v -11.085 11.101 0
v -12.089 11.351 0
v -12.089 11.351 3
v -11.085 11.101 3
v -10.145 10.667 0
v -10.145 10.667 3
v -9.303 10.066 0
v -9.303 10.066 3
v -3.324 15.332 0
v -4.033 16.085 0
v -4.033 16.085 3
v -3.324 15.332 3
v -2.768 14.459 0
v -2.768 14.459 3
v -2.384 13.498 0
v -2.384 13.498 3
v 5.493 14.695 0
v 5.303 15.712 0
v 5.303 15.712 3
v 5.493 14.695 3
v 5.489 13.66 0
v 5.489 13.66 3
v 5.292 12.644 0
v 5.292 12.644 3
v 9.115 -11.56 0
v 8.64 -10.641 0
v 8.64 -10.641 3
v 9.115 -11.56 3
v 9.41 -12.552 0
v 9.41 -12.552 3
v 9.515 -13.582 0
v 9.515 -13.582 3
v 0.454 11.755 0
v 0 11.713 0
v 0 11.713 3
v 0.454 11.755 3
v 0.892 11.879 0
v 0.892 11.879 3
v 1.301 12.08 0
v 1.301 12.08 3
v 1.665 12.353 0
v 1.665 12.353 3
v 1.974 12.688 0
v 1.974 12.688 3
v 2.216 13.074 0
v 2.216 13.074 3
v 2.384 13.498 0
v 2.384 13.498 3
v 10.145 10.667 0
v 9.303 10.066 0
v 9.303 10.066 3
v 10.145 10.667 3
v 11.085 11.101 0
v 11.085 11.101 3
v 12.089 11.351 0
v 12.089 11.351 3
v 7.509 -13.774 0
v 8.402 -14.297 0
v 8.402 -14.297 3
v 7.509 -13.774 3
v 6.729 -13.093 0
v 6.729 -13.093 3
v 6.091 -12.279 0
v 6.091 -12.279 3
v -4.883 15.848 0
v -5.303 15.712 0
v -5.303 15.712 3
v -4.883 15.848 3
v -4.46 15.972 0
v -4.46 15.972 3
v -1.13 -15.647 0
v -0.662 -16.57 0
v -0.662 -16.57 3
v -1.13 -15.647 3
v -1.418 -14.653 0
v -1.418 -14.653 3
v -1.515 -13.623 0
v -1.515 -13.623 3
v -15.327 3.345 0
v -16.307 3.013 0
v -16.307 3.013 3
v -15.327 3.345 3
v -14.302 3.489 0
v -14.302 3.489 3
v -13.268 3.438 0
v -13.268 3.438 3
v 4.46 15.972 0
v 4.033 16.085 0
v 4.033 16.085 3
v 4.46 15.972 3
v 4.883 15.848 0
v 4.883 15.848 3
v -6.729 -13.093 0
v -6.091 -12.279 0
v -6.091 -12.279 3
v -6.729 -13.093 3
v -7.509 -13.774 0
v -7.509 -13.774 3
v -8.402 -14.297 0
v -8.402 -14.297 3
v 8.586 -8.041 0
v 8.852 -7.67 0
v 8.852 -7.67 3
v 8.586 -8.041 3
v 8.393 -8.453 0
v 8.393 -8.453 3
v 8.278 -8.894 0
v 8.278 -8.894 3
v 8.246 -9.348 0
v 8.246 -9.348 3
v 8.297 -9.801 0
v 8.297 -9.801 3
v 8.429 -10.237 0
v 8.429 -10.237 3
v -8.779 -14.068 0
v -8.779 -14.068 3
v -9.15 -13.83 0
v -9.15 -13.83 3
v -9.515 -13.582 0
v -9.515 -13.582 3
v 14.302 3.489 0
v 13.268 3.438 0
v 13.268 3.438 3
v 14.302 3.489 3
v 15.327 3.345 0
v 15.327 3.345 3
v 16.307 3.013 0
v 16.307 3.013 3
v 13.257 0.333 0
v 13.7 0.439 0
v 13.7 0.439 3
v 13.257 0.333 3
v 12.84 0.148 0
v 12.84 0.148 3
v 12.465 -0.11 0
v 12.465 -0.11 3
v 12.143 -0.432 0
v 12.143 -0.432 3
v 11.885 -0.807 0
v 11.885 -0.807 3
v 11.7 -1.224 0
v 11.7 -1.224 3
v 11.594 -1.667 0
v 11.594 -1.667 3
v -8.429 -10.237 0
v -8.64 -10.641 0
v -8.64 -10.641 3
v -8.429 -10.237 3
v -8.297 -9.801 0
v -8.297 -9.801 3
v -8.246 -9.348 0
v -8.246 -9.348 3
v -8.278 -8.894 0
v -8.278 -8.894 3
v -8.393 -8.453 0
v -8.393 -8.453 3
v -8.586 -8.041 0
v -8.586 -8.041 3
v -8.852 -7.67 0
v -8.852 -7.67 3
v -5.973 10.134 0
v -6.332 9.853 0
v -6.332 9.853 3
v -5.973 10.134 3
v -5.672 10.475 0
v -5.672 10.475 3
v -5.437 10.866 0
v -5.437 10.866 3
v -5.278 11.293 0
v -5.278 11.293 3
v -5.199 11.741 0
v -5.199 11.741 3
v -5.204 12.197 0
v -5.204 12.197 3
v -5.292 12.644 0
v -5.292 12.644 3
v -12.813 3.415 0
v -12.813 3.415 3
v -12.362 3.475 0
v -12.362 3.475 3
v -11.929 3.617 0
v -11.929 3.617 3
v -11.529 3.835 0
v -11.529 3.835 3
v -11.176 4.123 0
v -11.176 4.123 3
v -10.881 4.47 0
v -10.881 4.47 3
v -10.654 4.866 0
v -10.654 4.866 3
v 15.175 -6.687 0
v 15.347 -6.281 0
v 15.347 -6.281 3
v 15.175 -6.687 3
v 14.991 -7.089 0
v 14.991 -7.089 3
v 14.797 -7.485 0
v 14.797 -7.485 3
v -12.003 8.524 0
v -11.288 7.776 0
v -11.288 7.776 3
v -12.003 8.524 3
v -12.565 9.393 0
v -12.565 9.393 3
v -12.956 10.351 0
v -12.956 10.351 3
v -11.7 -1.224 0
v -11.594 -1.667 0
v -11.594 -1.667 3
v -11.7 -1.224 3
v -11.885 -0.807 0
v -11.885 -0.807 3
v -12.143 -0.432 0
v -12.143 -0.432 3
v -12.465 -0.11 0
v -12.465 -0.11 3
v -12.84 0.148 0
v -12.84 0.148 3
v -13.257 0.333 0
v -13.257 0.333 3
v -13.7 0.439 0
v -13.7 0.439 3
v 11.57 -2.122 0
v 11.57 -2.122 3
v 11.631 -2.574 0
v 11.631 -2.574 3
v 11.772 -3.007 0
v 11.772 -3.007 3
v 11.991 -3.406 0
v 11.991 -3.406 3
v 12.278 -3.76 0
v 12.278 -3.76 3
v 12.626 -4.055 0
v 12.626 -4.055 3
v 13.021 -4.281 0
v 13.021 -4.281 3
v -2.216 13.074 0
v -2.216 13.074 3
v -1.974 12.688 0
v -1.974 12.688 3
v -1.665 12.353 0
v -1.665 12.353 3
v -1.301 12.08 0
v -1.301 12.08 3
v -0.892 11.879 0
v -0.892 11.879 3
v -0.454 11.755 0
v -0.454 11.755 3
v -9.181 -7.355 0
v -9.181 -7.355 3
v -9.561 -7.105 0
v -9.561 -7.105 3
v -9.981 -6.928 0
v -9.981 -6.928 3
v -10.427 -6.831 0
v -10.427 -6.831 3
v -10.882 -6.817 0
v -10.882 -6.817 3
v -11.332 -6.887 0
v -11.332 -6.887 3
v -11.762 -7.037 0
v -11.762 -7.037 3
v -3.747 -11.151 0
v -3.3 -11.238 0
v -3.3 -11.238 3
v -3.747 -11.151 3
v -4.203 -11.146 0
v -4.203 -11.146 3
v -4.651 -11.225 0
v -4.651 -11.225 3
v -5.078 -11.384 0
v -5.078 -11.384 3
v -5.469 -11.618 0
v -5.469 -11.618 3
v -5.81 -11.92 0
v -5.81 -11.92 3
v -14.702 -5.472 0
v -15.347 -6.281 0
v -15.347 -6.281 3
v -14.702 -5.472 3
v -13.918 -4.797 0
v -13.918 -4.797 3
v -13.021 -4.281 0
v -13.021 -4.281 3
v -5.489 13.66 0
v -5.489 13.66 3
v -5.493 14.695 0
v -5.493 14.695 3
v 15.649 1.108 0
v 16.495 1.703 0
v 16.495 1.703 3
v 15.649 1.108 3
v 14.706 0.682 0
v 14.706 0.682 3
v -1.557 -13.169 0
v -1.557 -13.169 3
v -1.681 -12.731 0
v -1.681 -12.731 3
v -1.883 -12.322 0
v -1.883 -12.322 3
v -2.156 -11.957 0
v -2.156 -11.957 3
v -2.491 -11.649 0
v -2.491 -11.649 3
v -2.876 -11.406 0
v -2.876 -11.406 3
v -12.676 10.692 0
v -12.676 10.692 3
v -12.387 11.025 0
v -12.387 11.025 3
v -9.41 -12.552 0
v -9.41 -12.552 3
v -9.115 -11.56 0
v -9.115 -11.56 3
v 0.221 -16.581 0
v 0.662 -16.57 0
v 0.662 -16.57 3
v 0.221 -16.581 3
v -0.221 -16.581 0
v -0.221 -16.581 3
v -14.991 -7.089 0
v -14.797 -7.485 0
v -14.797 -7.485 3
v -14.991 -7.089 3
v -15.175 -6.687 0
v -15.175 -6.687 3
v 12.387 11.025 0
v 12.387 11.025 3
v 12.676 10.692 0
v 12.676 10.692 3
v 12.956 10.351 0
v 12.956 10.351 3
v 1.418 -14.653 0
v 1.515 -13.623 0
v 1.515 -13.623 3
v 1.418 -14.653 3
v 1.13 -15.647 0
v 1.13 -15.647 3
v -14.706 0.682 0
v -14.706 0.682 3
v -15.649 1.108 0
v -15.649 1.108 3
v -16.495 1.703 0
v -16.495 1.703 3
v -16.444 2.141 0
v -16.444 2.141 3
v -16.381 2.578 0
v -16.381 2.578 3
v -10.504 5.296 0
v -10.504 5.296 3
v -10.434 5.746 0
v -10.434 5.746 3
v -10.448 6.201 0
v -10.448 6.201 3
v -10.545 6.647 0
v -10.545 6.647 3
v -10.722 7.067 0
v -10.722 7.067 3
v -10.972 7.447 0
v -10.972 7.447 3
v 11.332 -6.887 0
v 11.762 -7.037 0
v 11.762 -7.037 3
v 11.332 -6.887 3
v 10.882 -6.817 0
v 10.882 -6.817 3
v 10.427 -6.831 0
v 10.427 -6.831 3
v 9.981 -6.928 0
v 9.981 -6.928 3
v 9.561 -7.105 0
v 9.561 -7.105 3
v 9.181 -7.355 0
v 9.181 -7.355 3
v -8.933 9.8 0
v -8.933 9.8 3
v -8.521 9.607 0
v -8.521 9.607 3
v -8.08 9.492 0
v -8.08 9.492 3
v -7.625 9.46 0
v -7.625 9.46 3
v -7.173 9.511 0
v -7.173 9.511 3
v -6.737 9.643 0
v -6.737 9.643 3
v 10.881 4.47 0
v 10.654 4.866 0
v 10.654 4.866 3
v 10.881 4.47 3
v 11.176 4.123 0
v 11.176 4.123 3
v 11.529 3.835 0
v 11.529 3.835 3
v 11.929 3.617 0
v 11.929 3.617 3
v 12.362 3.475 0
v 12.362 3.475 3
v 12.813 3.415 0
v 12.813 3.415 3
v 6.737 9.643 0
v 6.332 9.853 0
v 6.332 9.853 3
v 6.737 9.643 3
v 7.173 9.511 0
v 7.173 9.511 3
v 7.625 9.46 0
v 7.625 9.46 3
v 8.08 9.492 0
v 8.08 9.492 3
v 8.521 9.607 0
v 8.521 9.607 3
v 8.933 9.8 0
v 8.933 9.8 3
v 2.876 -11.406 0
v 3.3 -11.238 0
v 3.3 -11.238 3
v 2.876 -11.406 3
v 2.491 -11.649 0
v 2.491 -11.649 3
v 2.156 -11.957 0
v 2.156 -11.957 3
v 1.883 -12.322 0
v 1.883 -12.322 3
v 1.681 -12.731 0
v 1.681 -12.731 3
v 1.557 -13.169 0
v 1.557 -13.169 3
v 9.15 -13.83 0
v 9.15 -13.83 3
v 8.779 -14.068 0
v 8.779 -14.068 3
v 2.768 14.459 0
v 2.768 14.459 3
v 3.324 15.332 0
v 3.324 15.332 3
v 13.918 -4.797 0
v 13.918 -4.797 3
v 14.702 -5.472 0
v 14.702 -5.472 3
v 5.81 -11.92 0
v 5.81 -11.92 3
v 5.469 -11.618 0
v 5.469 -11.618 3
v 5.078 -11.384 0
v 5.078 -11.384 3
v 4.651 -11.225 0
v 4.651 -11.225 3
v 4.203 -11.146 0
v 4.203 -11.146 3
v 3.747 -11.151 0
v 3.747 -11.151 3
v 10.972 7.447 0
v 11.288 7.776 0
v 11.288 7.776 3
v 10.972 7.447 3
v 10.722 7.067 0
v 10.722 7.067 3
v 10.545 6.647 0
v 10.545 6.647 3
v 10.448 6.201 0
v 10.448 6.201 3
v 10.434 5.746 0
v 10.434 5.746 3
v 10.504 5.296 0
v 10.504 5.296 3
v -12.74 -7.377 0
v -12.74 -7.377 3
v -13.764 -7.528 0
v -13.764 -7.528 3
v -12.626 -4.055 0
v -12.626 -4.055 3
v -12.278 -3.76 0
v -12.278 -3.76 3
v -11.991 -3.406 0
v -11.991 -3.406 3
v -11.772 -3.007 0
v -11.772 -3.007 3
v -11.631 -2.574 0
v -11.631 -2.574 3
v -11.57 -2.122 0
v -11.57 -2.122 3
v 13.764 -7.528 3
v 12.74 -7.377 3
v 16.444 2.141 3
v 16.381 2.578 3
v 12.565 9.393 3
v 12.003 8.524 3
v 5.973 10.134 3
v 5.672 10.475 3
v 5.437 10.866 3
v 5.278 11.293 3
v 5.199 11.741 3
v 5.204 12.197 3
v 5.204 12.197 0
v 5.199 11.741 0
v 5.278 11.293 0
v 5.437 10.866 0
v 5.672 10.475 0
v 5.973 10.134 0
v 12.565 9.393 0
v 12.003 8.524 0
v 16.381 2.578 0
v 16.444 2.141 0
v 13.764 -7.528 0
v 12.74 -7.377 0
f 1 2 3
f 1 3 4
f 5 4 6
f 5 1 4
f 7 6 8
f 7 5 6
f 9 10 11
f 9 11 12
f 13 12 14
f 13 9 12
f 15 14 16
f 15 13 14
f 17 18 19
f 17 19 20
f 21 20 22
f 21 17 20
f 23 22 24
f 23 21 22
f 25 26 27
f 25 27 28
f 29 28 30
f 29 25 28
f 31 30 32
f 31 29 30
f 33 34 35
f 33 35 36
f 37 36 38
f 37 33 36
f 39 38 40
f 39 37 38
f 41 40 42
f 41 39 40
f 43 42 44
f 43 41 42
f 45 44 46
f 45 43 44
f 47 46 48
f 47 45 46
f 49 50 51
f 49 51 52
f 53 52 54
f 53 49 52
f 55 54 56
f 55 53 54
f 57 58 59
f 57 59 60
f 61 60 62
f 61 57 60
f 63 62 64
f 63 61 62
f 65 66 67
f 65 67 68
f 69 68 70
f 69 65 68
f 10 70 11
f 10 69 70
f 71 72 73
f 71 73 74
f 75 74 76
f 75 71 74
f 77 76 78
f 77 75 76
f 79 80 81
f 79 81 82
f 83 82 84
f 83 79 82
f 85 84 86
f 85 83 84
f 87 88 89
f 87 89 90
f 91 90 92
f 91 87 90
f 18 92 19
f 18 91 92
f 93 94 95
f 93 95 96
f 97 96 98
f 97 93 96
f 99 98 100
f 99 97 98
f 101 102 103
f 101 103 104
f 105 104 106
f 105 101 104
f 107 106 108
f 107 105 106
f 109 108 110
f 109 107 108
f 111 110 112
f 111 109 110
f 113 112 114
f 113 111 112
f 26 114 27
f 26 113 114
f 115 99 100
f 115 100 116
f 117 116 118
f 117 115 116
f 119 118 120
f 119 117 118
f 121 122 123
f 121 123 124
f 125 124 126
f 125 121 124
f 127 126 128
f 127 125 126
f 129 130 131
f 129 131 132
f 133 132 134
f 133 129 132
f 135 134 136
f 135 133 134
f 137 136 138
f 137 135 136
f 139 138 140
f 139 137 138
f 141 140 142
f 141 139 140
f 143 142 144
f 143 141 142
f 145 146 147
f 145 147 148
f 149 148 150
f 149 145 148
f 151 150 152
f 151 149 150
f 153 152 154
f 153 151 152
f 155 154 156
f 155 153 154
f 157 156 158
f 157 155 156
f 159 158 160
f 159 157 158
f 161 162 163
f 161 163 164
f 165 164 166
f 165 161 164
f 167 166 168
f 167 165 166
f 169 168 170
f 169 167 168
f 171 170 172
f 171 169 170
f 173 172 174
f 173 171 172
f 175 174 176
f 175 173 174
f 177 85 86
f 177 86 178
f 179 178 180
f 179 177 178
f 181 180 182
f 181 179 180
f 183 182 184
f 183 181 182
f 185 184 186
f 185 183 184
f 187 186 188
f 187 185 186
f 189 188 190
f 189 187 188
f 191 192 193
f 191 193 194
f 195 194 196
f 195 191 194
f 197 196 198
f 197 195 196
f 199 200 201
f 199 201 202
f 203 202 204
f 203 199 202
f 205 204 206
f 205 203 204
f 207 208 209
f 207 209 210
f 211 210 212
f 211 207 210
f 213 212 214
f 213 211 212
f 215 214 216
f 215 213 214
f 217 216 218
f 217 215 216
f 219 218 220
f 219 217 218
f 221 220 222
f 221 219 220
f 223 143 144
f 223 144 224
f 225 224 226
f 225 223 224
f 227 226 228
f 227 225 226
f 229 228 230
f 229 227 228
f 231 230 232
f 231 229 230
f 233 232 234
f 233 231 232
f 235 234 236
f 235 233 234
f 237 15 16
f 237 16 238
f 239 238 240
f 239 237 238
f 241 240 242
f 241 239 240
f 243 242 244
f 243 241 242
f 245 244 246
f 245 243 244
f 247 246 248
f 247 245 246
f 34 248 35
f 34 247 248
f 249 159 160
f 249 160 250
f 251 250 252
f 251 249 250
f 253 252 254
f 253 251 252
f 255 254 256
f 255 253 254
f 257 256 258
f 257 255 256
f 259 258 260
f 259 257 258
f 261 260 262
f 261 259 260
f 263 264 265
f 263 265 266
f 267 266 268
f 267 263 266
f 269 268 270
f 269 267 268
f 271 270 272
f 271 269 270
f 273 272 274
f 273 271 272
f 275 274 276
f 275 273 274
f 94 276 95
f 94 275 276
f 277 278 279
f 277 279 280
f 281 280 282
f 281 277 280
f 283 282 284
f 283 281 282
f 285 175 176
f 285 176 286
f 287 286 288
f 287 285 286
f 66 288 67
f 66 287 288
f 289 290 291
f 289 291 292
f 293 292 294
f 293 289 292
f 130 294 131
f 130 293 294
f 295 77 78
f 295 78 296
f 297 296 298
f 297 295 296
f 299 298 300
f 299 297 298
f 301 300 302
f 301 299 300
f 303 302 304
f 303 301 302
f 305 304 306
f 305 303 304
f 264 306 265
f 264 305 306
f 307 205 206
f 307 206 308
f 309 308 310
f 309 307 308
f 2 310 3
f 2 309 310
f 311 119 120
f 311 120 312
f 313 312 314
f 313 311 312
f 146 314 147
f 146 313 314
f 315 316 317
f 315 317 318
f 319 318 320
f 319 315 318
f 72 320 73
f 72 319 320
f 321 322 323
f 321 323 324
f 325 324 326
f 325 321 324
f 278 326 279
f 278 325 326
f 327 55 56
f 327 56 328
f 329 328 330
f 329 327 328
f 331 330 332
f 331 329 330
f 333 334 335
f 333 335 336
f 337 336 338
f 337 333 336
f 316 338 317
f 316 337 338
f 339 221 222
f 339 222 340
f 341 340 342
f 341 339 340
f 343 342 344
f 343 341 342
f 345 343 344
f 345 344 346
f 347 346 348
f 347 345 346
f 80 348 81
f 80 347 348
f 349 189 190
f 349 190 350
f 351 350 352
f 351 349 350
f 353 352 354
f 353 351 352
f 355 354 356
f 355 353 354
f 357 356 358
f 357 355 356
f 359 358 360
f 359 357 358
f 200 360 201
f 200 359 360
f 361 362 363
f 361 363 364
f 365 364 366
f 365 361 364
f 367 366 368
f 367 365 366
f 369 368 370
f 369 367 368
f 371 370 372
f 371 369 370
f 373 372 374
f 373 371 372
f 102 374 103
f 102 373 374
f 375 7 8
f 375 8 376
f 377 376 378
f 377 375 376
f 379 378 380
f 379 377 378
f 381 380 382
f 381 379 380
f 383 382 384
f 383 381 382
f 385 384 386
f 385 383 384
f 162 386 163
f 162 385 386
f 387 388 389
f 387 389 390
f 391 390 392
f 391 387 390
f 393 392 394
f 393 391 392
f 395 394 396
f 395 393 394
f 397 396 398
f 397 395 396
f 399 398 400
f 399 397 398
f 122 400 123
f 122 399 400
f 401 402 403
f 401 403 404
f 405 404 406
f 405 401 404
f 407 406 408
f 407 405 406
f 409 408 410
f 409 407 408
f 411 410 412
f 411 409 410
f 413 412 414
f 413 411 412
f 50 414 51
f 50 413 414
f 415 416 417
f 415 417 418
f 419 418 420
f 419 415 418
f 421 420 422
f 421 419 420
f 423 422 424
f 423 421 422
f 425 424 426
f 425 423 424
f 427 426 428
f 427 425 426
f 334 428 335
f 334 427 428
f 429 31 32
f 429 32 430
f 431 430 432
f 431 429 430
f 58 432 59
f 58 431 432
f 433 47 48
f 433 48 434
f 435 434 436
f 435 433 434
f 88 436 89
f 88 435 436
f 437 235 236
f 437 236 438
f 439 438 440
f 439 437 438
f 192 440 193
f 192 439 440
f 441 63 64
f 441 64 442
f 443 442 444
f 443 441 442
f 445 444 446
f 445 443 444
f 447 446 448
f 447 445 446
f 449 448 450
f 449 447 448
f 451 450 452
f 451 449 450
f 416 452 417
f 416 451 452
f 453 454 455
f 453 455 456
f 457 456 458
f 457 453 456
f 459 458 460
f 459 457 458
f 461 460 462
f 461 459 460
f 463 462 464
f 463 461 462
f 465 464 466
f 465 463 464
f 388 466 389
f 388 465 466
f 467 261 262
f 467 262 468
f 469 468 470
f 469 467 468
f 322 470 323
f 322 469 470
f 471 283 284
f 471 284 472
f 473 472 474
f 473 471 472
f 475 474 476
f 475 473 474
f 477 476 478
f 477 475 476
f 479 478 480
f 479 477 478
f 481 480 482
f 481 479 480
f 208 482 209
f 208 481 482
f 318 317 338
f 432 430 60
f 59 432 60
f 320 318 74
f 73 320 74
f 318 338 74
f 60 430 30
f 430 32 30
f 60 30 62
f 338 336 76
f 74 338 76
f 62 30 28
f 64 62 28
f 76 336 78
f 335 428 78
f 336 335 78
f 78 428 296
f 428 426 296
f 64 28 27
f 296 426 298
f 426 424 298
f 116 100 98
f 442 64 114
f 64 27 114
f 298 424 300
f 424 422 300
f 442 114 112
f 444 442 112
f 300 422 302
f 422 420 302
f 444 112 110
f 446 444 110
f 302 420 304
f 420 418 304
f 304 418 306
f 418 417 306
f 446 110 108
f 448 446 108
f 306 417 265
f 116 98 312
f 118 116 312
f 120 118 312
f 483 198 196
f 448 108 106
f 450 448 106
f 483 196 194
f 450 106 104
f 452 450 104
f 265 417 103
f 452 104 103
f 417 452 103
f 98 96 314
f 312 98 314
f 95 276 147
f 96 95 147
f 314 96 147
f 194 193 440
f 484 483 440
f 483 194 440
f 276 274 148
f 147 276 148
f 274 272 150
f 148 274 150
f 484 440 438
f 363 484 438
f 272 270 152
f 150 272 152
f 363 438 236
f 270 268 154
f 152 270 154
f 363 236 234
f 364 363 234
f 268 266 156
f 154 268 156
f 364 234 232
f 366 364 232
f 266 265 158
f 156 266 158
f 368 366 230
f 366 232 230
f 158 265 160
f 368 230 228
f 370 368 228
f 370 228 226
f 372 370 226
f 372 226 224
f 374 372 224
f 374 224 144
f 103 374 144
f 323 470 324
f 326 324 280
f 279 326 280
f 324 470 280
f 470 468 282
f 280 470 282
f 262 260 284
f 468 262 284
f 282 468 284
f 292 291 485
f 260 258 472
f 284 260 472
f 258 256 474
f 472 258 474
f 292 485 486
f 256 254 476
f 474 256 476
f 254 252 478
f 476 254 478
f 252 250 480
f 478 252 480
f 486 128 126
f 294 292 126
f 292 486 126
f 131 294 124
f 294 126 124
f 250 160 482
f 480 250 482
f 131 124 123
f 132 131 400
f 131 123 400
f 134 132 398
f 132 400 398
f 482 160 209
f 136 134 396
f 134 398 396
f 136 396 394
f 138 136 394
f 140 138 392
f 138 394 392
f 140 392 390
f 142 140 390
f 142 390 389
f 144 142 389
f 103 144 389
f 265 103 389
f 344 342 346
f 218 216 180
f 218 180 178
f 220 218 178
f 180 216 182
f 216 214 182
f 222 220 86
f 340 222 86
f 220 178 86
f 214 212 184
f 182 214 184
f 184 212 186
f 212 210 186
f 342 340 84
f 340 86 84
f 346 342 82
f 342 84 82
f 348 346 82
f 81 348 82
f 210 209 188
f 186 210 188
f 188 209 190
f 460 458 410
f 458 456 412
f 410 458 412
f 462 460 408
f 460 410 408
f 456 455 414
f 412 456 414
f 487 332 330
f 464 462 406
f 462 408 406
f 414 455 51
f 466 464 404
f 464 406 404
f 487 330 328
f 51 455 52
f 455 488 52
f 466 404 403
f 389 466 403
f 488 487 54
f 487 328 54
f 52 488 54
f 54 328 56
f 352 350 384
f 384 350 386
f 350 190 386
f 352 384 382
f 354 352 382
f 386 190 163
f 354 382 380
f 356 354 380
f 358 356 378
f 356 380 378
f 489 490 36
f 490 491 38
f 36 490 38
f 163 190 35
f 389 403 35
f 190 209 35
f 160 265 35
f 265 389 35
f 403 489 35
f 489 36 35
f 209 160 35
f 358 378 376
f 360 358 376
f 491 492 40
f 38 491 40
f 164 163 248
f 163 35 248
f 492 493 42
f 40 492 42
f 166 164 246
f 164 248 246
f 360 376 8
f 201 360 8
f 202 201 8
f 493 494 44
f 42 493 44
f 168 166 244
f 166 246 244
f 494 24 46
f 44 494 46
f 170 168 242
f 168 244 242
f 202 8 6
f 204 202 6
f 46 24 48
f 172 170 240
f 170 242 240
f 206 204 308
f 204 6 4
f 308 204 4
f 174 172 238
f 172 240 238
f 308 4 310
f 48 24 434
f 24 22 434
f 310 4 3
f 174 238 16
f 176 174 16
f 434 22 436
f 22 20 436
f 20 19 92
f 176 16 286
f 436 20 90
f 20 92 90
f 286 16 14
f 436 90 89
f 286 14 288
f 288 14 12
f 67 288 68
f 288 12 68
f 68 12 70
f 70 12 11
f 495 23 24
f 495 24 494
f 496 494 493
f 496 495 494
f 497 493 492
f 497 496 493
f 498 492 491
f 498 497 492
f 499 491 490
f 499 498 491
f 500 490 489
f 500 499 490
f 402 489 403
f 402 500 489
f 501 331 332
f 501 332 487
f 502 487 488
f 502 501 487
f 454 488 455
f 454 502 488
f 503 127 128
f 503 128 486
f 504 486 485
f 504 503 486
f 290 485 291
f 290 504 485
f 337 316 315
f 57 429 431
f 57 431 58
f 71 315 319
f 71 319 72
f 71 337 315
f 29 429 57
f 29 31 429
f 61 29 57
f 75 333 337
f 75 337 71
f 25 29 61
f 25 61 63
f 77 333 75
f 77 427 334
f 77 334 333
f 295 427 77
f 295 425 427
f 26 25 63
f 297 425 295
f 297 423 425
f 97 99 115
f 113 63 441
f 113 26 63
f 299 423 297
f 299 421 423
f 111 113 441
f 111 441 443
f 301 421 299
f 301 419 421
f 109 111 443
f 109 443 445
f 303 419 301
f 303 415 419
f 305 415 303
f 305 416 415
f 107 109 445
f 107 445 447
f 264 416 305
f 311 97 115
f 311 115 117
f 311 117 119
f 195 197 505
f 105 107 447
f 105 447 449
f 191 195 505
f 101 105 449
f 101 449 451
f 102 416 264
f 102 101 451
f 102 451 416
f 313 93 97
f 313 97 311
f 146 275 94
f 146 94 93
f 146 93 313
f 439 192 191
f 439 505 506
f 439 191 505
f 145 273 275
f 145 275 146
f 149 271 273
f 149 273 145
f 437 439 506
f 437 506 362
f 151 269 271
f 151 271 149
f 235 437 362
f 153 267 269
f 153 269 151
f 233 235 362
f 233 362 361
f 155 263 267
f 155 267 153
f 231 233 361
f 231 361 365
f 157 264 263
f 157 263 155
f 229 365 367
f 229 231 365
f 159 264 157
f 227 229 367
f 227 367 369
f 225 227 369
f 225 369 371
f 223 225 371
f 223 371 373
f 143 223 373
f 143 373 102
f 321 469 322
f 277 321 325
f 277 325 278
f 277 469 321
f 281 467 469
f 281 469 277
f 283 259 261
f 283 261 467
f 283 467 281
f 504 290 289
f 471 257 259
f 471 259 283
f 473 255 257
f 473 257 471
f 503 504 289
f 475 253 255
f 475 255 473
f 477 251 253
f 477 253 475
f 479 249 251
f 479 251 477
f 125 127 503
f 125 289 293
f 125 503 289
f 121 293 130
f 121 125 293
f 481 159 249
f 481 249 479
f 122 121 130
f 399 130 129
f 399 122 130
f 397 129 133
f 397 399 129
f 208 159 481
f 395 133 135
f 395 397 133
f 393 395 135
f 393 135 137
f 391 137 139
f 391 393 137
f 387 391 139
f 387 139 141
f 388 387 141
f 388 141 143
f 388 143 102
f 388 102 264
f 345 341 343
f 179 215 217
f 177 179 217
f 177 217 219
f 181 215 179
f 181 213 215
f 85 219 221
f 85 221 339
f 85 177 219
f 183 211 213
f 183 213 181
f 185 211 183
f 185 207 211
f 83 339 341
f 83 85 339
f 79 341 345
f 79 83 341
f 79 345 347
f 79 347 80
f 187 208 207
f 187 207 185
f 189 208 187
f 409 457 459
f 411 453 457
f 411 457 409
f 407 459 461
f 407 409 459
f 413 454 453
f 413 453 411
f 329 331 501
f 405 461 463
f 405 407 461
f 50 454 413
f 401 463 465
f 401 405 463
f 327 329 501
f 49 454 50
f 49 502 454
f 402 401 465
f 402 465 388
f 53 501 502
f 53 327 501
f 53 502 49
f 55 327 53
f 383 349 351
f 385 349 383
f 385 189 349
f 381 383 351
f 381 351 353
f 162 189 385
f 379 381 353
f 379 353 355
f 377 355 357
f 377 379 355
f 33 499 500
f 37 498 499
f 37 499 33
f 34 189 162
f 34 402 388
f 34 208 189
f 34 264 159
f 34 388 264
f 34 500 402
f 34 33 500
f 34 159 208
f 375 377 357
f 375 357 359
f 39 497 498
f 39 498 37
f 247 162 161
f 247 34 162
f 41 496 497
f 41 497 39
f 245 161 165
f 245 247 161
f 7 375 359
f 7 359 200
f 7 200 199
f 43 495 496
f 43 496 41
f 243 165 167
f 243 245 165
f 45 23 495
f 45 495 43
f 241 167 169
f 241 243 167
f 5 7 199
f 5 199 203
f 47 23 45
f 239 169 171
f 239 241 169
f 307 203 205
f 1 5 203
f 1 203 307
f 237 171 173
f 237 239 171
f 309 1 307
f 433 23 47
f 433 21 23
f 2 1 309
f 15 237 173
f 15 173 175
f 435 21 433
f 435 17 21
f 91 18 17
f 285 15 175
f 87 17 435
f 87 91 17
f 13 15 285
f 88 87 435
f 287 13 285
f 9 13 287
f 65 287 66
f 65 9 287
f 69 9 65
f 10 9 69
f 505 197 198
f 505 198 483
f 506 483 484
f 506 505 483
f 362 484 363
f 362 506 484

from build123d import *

# Parameters (mm, degrees)
EXTRUDE_1_DEPTH          = 3
PATTERN_CIRCULAR_1_COUNT = 11


with BuildPart() as part:
    # Эскиз2 → Бобышка-Вытянуть1 (new body)
    with BuildSketch(Plane.XY):
        with BuildLine():
            Line((0, 0), (0, 11.712862132))
            ThreePointArc((0, 11.712862132), (1.489205001, 12.208517148), (2.384340039, 13.497756728))
            ThreePointArc((2.384340039, 13.497756728), (3.025331037, 14.908293504), (4.033365809, 16.084877268))
            ThreePointArc((4.033365809, 16.084877268), (4.671932148, 15.911139698), (5.303057959, 15.712062015))
            ThreePointArc((5.303057959, 15.712062015), (5.514961564, 14.177272024), (5.291603749, 12.644107081))
            ThreePointArc((5.291603749, 12.644107081), (5.347623722, 11.075583191), (6.332451358, 9.853486648))
            Line((6.332451358, 9.853486648), (0, 0))
        make_face()
    extrude_1 = extrude(amount=EXTRUDE_1_DEPTH)

    # Круговой массив1: Бобышка-Вытянуть1 ×11 about axis
    pattern_circular_1_axis = Axis((0, 0, 0), (0, 0, 1))
    for i in range(1, PATTERN_CIRCULAR_1_COUNT):
        add(extrude_1.rotate(pattern_circular_1_axis, i * 360 / PATTERN_CIRCULAR_1_COUNT))


solid = part.part
